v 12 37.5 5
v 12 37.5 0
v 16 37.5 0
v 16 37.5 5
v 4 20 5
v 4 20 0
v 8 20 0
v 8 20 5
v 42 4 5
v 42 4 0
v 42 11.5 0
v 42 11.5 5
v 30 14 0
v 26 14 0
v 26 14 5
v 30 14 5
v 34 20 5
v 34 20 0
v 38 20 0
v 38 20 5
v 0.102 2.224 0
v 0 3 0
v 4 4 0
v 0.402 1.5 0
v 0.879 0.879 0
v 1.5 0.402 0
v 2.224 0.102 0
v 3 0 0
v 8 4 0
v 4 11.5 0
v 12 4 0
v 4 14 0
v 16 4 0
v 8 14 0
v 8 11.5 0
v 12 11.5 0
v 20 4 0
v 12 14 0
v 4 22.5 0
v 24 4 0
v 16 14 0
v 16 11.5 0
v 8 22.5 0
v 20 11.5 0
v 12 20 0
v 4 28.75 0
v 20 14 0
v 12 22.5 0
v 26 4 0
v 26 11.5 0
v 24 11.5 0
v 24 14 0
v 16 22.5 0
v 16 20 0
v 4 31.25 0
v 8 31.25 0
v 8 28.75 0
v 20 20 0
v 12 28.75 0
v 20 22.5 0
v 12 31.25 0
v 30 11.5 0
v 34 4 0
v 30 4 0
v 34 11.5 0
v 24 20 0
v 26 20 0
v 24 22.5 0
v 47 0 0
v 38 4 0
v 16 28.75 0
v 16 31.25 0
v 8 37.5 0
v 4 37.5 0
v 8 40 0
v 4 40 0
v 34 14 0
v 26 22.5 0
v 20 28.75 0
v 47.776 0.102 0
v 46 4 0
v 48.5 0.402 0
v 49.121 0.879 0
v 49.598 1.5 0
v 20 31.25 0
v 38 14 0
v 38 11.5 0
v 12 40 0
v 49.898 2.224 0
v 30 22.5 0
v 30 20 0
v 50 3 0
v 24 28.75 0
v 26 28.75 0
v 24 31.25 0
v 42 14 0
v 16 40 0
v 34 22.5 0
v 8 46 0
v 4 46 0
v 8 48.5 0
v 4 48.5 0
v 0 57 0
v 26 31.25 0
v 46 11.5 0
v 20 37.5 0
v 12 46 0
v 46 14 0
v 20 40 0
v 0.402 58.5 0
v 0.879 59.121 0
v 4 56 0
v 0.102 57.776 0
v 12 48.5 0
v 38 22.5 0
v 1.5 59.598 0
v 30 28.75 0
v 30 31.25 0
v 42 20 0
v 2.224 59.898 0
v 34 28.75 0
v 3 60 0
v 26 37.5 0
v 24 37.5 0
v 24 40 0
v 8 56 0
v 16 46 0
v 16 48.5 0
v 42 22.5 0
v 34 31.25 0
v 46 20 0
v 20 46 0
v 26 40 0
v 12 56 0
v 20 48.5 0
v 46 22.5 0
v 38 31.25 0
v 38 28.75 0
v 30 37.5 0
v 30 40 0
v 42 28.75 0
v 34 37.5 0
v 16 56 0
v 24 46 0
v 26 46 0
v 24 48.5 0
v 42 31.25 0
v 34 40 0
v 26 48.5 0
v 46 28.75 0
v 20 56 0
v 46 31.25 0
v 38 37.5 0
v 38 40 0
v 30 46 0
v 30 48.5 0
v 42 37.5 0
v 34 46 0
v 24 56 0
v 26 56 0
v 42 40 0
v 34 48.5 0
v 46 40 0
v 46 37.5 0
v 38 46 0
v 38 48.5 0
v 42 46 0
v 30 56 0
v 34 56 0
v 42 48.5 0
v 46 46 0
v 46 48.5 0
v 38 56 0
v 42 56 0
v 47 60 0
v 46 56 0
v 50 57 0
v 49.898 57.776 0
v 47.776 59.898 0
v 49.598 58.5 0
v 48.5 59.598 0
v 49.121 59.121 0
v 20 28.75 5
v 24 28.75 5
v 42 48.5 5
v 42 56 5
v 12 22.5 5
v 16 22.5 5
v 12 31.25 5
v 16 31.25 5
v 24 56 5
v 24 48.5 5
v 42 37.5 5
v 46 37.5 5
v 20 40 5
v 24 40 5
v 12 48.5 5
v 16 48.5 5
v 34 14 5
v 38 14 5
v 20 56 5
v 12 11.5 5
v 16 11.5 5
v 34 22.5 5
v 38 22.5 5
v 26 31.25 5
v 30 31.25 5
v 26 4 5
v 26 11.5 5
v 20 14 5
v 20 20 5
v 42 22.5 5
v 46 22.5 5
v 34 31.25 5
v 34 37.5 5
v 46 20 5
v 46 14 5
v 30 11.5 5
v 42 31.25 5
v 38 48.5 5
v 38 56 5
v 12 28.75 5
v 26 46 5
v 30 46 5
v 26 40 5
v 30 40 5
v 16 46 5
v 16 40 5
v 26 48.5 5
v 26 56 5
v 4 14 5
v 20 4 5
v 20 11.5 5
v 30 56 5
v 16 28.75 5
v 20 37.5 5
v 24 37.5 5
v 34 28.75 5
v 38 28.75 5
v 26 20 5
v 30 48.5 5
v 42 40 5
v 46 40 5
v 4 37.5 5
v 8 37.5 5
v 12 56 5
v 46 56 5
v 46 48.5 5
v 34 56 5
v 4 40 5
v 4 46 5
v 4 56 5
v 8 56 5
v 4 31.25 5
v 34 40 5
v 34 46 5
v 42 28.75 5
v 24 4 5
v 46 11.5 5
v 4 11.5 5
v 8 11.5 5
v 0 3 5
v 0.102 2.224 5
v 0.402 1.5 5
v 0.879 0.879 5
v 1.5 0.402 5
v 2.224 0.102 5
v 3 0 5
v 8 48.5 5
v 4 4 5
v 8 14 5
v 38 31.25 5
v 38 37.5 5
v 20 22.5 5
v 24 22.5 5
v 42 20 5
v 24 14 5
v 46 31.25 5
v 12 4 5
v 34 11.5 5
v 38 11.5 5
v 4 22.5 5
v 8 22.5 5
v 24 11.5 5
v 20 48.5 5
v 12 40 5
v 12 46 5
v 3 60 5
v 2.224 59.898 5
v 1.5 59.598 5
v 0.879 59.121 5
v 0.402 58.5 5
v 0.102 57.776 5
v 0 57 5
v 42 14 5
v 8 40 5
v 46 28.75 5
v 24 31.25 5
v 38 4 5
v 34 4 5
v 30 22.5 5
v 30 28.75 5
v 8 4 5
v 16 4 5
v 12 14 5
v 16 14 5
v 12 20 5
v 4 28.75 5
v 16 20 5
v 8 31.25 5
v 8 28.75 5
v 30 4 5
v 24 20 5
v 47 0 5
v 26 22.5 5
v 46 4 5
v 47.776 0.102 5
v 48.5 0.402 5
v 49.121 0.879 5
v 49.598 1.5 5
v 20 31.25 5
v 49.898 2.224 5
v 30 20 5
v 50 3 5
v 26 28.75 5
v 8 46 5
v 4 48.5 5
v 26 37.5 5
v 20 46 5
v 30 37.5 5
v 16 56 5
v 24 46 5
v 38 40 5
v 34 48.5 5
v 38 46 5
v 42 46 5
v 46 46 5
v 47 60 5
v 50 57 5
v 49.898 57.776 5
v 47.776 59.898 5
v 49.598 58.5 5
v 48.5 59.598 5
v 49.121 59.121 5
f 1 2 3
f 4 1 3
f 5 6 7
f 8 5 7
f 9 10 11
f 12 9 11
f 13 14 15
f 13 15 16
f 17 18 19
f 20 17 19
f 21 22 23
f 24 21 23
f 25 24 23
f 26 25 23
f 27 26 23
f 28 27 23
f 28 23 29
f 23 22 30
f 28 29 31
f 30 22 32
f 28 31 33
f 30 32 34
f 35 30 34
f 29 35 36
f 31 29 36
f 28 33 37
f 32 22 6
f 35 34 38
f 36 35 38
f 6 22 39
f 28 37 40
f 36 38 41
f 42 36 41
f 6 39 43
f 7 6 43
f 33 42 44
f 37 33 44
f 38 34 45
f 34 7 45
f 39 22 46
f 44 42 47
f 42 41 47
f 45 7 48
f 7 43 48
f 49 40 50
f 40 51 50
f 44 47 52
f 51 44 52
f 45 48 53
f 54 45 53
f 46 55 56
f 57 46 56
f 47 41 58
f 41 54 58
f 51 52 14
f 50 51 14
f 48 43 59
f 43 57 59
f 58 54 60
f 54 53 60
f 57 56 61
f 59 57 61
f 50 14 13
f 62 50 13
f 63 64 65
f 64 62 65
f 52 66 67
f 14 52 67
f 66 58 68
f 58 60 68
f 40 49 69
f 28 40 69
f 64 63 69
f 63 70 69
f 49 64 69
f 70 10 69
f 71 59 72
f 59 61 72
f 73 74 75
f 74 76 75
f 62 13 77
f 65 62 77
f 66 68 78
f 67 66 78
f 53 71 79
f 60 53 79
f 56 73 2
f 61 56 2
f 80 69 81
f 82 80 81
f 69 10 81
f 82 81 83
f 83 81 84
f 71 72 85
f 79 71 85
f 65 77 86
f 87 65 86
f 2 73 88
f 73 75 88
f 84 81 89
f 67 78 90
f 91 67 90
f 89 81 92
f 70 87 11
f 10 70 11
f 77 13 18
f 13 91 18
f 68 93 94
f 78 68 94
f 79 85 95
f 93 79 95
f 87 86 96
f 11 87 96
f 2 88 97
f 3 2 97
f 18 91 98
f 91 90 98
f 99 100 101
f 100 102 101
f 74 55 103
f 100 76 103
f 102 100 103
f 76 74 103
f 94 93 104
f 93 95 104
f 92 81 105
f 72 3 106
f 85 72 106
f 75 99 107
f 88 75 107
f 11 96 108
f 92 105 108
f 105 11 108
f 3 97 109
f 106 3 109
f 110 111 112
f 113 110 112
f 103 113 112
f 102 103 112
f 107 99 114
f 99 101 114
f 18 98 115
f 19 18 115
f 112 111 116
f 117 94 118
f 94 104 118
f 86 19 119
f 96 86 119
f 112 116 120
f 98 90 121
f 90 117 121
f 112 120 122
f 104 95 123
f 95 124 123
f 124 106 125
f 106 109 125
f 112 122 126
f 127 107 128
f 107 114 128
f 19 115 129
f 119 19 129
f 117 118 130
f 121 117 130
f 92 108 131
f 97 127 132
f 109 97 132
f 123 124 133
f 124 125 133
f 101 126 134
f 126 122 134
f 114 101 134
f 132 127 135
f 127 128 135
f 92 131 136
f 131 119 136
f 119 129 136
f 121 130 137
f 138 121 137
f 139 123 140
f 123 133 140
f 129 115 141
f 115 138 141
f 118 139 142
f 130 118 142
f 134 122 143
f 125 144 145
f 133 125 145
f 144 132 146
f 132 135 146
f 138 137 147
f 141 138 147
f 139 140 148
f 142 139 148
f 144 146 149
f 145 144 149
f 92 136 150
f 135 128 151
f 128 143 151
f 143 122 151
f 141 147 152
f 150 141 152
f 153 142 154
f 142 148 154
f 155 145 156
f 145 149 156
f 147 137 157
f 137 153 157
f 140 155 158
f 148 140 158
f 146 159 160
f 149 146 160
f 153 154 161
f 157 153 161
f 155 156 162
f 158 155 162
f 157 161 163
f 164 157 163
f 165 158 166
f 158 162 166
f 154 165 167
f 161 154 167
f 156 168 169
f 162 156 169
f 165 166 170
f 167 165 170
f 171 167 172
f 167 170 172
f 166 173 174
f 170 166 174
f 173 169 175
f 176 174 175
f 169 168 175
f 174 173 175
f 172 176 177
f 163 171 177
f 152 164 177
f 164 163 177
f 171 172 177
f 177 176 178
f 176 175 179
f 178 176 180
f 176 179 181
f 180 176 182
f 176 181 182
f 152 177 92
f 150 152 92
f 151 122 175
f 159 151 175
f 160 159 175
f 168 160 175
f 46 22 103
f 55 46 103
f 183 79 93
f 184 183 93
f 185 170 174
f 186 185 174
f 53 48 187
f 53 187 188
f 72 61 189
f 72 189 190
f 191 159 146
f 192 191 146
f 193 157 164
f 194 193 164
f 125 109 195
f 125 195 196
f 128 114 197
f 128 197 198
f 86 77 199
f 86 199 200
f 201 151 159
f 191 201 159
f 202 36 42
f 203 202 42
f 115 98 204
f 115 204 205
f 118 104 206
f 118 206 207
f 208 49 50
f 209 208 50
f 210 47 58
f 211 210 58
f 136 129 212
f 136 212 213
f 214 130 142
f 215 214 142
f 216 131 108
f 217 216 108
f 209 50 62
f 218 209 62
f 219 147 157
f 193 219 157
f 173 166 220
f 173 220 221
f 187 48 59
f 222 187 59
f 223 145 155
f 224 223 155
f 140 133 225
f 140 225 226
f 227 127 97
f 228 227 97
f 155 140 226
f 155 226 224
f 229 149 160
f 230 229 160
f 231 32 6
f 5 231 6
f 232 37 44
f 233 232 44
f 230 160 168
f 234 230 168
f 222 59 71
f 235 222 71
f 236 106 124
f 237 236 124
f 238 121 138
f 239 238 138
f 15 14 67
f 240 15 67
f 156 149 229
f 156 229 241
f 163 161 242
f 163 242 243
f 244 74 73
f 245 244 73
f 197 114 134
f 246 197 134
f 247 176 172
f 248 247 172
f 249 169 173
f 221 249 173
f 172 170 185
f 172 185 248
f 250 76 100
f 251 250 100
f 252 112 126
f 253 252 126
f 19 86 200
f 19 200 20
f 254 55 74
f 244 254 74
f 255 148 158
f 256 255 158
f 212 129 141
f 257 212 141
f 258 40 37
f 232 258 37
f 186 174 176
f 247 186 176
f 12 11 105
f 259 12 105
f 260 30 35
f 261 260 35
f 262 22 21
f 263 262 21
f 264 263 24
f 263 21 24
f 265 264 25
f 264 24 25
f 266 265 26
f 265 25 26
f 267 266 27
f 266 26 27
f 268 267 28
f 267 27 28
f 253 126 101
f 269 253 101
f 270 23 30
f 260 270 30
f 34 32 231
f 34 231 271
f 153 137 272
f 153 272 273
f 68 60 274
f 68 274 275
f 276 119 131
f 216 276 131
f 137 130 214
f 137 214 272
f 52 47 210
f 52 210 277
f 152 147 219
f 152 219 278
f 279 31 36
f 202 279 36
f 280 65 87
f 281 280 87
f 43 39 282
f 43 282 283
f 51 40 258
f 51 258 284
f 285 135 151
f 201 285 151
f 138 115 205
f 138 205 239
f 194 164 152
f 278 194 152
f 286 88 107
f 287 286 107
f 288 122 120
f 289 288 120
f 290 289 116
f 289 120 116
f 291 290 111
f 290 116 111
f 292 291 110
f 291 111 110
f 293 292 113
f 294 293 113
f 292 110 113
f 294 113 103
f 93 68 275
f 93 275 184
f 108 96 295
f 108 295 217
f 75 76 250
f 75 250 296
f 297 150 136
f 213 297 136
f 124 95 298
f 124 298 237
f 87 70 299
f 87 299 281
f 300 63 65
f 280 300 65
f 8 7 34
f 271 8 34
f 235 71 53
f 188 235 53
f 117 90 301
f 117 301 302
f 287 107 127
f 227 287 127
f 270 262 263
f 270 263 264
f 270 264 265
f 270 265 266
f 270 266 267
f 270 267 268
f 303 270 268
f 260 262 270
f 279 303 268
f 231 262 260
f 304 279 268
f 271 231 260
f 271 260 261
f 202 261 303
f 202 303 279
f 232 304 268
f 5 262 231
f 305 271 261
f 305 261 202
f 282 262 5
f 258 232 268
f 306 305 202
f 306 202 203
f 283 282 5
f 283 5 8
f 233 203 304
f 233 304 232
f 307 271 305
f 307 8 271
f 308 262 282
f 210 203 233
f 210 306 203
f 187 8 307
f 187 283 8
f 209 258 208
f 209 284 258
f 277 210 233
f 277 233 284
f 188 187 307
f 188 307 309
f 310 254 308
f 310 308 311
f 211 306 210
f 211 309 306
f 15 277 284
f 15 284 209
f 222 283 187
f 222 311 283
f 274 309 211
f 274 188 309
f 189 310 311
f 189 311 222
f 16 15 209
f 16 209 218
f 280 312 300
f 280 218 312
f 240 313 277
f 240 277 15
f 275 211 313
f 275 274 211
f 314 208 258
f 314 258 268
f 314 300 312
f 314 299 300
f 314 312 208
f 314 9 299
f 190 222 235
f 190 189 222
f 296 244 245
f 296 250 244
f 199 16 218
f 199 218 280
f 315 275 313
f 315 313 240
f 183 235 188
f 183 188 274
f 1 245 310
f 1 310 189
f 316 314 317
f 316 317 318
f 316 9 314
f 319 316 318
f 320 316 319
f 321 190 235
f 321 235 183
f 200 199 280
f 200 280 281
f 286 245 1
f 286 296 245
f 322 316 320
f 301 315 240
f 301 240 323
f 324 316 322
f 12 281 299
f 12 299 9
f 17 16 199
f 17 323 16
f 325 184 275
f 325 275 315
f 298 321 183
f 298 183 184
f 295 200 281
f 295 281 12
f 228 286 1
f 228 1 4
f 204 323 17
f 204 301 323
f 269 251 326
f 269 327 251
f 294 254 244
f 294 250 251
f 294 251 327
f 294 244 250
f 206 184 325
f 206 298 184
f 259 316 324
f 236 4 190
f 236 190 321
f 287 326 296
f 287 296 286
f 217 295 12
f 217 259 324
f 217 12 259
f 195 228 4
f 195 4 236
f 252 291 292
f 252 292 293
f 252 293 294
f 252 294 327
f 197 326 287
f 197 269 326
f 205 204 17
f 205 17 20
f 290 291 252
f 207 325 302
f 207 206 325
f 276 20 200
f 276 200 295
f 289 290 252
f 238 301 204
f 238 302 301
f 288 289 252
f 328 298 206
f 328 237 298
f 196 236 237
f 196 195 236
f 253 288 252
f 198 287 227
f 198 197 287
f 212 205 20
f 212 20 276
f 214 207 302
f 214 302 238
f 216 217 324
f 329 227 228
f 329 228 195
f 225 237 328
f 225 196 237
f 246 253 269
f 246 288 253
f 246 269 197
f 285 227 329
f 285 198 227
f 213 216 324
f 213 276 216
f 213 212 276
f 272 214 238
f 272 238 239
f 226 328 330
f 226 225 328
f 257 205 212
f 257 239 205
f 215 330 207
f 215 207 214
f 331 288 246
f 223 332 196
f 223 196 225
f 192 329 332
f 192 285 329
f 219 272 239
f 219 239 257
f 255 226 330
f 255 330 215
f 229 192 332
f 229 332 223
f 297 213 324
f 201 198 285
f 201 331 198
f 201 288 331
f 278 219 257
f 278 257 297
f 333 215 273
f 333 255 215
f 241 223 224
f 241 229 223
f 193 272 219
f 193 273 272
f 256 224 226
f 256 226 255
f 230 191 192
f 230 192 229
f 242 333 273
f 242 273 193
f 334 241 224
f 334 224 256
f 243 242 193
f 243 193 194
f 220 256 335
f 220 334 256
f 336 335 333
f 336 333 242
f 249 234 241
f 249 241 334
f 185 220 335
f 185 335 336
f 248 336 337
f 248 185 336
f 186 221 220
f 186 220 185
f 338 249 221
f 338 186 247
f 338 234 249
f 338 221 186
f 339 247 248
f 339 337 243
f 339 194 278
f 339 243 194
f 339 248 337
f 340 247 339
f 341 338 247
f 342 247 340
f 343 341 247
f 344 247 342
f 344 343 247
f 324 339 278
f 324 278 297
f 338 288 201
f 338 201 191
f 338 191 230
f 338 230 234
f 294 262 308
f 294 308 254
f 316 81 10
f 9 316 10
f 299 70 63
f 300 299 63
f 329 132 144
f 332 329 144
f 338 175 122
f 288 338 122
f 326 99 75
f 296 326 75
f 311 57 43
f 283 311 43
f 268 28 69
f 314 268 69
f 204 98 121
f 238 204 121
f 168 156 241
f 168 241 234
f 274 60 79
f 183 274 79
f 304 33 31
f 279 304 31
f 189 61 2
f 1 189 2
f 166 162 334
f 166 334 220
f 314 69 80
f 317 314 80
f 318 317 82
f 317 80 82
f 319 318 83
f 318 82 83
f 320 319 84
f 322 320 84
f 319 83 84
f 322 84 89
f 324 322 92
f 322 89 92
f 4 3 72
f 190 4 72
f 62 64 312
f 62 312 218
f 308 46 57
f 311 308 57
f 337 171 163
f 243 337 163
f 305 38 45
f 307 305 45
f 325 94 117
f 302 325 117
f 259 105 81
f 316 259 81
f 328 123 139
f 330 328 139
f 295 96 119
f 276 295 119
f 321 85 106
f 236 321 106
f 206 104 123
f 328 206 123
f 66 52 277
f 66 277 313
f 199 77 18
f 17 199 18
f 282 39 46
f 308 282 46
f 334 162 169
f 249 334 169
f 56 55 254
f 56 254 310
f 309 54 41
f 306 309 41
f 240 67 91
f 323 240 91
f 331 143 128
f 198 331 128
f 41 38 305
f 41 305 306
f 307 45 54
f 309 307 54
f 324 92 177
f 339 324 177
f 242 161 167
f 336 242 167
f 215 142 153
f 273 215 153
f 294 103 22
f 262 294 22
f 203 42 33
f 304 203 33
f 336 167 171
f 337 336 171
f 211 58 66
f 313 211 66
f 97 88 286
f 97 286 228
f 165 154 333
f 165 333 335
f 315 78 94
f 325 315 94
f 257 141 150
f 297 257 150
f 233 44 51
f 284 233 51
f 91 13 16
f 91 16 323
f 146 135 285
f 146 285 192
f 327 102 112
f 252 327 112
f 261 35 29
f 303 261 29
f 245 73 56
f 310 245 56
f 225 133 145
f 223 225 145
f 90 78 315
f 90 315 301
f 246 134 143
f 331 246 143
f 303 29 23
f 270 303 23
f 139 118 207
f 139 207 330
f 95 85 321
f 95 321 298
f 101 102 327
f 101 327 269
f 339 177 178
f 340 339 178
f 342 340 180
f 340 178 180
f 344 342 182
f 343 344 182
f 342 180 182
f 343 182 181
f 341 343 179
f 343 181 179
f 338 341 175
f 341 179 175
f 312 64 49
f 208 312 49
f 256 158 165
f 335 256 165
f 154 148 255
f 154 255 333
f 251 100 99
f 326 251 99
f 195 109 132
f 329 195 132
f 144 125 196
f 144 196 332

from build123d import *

# Parameters (mm, degrees)
F1_DEPTH = 5
F0_W     = 4
F0_H     = 7.5
F0_H_2   = 6.25
F0_H_3   = 6
F0_W_2   = 2
F0_H_4   = 2.5
F2_DEPTH = 5


# Not quite as in the source:
# - a feature names something its author has since deleted; it is built from what else it names


with BuildPart() as f1:
    # F0 (on Top) → F1 (new body)
    with BuildSketch(Plane.XY):
        with BuildLine():
            ThreePointArc((0, 3), (0.8786796564, 0.8786796564), (3, 0))
            Line((3, 0), (47, 0))
            ThreePointArc((47, 0), (49.1213203436, 0.8786796564), (50, 3))
            Line((50, 3), (50, 57))
            ThreePointArc((50, 57), (49.1213203436, 59.1213203436), (47, 60))
            Line((47, 60), (25, 60))
            Line((25, 60), (3, 60))
            ThreePointArc((3, 60), (0.8786796564, 59.1213203436), (0, 57))
            Line((0, 57), (0, 3))
        make_face()
        Polygon((24, 56), (25, 56), (26, 56), (30, 56), (34, 56), (38, 56), (42, 56), (46, 56), (46, 48.5), (46, 46), (46, 40), (46, 37.5), (46, 31.25), (46, 28.75), (46, 22.5), (46, 20), (46, 14), (46, 11.5), (46, 4), (42, 4), (38, 4), (34, 4), (30, 4), (26, 4), (24, 4), (20, 4), (16, 4), (12, 4), (8, 4), (4, 4), (4, 11.5), (4, 14), (4, 20), (4, 22.5), (4, 28.75), (4, 31.25), (4, 37.5), (4, 40), (4, 46), (4, 48.5), (4, 56), (8, 56), (12, 56), (16, 56), (20, 56), align=None, mode=Mode.SUBTRACT)
    extrude(amount=F1_DEPTH)

    # F0 (on Top) → F2 (join)
    with BuildSketch(Plane.XY):
        with BuildLine():
            ThreePointArc((0, 3), (0.8786796564, 0.8786796564), (3, 0))
            Line((3, 0), (47, 0))
            ThreePointArc((47, 0), (49.1213203436, 0.8786796564), (50, 3))
            Line((50, 3), (50, 57))
            ThreePointArc((50, 57), (49.1213203436, 59.1213203436), (47, 60))
            Line((47, 60), (25, 60))
            Line((25, 60), (3, 60))
            ThreePointArc((3, 60), (0.8786796564, 59.1213203436), (0, 57))
            Line((0, 57), (0, 3))
        make_face()
        Polygon((24, 56), (25, 56), (26, 56), (30, 56), (34, 56), (38, 56), (42, 56), (46, 56), (46, 48.5), (46, 46), (46, 40), (46, 37.5), (46, 31.25), (46, 28.75), (46, 22.5), (46, 20), (46, 14), (46, 11.5), (46, 4), (42, 4), (38, 4), (34, 4), (30, 4), (26, 4), (24, 4), (20, 4), (16, 4), (12, 4), (8, 4), (4, 4), (4, 11.5), (4, 14), (4, 20), (4, 22.5), (4, 28.75), (4, 31.25), (4, 37.5), (4, 40), (4, 46), (4, 48.5), (4, 56), (8, 56), (12, 56), (16, 56), (20, 56), align=None, mode=Mode.SUBTRACT)
        with Locations((18, 52.25)):
            Rectangle(F0_W, F0_H)
        with Locations((32, 52.25)):
            Rectangle(F0_W, F0_H)
        with Locations((10, 52.25)):
            Rectangle(F0_W, F0_H)
        with Locations((40, 52.25)):
            Rectangle(F0_W, F0_H)
        with Locations((18, 7.75)):
            Rectangle(F0_W, F0_H)
        with Locations((32, 7.75)):
            Rectangle(F0_W, F0_H)
        with Locations((10, 7.75)):
            Rectangle(F0_W, F0_H)
        with Locations((40, 7.75)):
            Rectangle(F0_W, F0_H)
        with Locations((18, 34.375)):
            Rectangle(F0_W, F0_H_2)
        with Locations((32, 34.375)):
            Rectangle(F0_W, F0_H_2)
        with Locations((10, 34.375)):
            Rectangle(F0_W, F0_H_2)
        with Locations((18, 25.625)):
            Rectangle(F0_W, F0_H_2)
        with Locations((40, 34.375)):
            Rectangle(F0_W, F0_H_2)
        with Locations((32, 25.625)):
            Rectangle(F0_W, F0_H_2)
        with Locations((10, 25.625)):
            Rectangle(F0_W, F0_H_2)
        with Locations((40, 25.625)):
            Rectangle(F0_W, F0_H_2)
        with Locations((18, 43)):
            Rectangle(F0_W, F0_H_3)
        with Locations((32, 43)):
            Rectangle(F0_W, F0_H_3)
        with Locations((10, 43)):
            Rectangle(F0_W, F0_H_3)
        with Locations((40, 43)):
            Rectangle(F0_W, F0_H_3)
        with Locations((18, 17)):
            Rectangle(F0_W, F0_H_3)
        with Locations((32, 17)):
            Rectangle(F0_W, F0_H_3)
        with Locations((10, 17)):
            Rectangle(F0_W, F0_H_3)
        with Locations((40, 17)):
            Rectangle(F0_W, F0_H_3)
        Polygon((26, 56), (25, 56), (24, 56), (24, 48.5), (26, 48.5), align=None)
        with Locations((25, 7.75)):
            Rectangle(F0_W_2, F0_H)
        with Locations((25, 34.375)):
            Rectangle(F0_W_2, F0_H_2)
        with Locations((25, 25.625)):
            Rectangle(F0_W_2, F0_H_2)
        with Locations((25, 43)):
            Rectangle(F0_W_2, F0_H_3)
        with Locations((25, 17)):
            Rectangle(F0_W_2, F0_H_3)
        with Locations((22, 47.25)):
            Rectangle(F0_W, F0_H_4)
        with Locations((28, 47.25)):
            Rectangle(F0_W, F0_H_4)
        with Locations((18, 47.25)):
            Rectangle(F0_W, F0_H_4)
        with Locations((32, 47.25)):
            Rectangle(F0_W, F0_H_4)
        with Locations((14, 47.25)):
            Rectangle(F0_W, F0_H_4)
        with Locations((22, 38.75)):
            Rectangle(F0_W, F0_H_4)
        with Locations((36, 47.25)):
            Rectangle(F0_W, F0_H_4)
        with Locations((28, 38.75)):
            Rectangle(F0_W, F0_H_4)
        with Locations((10, 47.25)):
            Rectangle(F0_W, F0_H_4)
        with Locations((18, 38.75)):
            Rectangle(F0_W, F0_H_4)
        with Locations((40, 47.25)):
            Rectangle(F0_W, F0_H_4)
        with Locations((32, 38.75)):
            Rectangle(F0_W, F0_H_4)
        with Locations((6, 47.25)):
            Rectangle(F0_W, F0_H_4)
        with Locations((14, 38.75)):
            Rectangle(F0_W, F0_H_4)
        with Locations((22, 30)):
            Rectangle(F0_W, F0_H_4)
        with Locations((44, 47.25)):
            Rectangle(F0_W, F0_H_4)
        with Locations((36, 38.75)):
            Rectangle(F0_W, F0_H_4)
        with Locations((28, 30)):
            Rectangle(F0_W, F0_H_4)
        with Locations((10, 38.75)):
            Rectangle(F0_W, F0_H_4)
        with Locations((18, 30)):
            Rectangle(F0_W, F0_H_4)
        with Locations((40, 38.75)):
            Rectangle(F0_W, F0_H_4)
        with Locations((32, 30)):
            Rectangle(F0_W, F0_H_4)
        with Locations((6, 38.75)):
            Rectangle(F0_W, F0_H_4)
        with Locations((14, 30)):
            Rectangle(F0_W, F0_H_4)
        with Locations((22, 21.25)):
            Rectangle(F0_W, F0_H_4)
        with Locations((44, 38.75)):
            Rectangle(F0_W, F0_H_4)
        with Locations((36, 30)):
            Rectangle(F0_W, F0_H_4)
        with Locations((28, 21.25)):
            Rectangle(F0_W, F0_H_4)
        with Locations((10, 30)):
            Rectangle(F0_W, F0_H_4)
        with Locations((18, 21.25)):
            Rectangle(F0_W, F0_H_4)
        with Locations((40, 30)):
            Rectangle(F0_W, F0_H_4)
        with Locations((32, 21.25)):
            Rectangle(F0_W, F0_H_4)
        with Locations((6, 30)):
            Rectangle(F0_W, F0_H_4)
        with Locations((14, 21.25)):
            Rectangle(F0_W, F0_H_4)
        with Locations((22, 12.75)):
            Rectangle(F0_W, F0_H_4)
        with Locations((44, 30)):
            Rectangle(F0_W, F0_H_4)
        with Locations((36, 21.25)):
            Rectangle(F0_W, F0_H_4)
        with Locations((28, 12.75)):
            Rectangle(F0_W, F0_H_4)
        with Locations((10, 21.25)):
            Rectangle(F0_W, F0_H_4)
        with Locations((18, 12.75)):
            Rectangle(F0_W, F0_H_4)
        with Locations((40, 21.25)):
            Rectangle(F0_W, F0_H_4)
        with Locations((32, 12.75)):
            Rectangle(F0_W, F0_H_4)
        with Locations((6, 21.25)):
            Rectangle(F0_W, F0_H_4)
        with Locations((14, 12.75)):
            Rectangle(F0_W, F0_H_4)
        with Locations((44, 21.25)):
            Rectangle(F0_W, F0_H_4)
        with Locations((36, 12.75)):
            Rectangle(F0_W, F0_H_4)
        with Locations((10, 12.75)):
            Rectangle(F0_W, F0_H_4)
        with Locations((40, 12.75)):
            Rectangle(F0_W, F0_H_4)
        with Locations((6, 12.75)):
            Rectangle(F0_W, F0_H_4)
        with Locations((44, 12.75)):
            Rectangle(F0_W, F0_H_4)
        with Locations((25, 47.25)):
            Rectangle(F0_W_2, F0_H_4)
        with Locations((25, 38.75)):
            Rectangle(F0_W_2, F0_H_4)
        with Locations((25, 30)):
            Rectangle(F0_W_2, F0_H_4)
        with Locations((25, 21.25)):
            Rectangle(F0_W_2, F0_H_4)
        with Locations((25, 12.75)):
            Rectangle(F0_W_2, F0_H_4)
    extrude(amount=F2_DEPTH)


solid = f1.part
